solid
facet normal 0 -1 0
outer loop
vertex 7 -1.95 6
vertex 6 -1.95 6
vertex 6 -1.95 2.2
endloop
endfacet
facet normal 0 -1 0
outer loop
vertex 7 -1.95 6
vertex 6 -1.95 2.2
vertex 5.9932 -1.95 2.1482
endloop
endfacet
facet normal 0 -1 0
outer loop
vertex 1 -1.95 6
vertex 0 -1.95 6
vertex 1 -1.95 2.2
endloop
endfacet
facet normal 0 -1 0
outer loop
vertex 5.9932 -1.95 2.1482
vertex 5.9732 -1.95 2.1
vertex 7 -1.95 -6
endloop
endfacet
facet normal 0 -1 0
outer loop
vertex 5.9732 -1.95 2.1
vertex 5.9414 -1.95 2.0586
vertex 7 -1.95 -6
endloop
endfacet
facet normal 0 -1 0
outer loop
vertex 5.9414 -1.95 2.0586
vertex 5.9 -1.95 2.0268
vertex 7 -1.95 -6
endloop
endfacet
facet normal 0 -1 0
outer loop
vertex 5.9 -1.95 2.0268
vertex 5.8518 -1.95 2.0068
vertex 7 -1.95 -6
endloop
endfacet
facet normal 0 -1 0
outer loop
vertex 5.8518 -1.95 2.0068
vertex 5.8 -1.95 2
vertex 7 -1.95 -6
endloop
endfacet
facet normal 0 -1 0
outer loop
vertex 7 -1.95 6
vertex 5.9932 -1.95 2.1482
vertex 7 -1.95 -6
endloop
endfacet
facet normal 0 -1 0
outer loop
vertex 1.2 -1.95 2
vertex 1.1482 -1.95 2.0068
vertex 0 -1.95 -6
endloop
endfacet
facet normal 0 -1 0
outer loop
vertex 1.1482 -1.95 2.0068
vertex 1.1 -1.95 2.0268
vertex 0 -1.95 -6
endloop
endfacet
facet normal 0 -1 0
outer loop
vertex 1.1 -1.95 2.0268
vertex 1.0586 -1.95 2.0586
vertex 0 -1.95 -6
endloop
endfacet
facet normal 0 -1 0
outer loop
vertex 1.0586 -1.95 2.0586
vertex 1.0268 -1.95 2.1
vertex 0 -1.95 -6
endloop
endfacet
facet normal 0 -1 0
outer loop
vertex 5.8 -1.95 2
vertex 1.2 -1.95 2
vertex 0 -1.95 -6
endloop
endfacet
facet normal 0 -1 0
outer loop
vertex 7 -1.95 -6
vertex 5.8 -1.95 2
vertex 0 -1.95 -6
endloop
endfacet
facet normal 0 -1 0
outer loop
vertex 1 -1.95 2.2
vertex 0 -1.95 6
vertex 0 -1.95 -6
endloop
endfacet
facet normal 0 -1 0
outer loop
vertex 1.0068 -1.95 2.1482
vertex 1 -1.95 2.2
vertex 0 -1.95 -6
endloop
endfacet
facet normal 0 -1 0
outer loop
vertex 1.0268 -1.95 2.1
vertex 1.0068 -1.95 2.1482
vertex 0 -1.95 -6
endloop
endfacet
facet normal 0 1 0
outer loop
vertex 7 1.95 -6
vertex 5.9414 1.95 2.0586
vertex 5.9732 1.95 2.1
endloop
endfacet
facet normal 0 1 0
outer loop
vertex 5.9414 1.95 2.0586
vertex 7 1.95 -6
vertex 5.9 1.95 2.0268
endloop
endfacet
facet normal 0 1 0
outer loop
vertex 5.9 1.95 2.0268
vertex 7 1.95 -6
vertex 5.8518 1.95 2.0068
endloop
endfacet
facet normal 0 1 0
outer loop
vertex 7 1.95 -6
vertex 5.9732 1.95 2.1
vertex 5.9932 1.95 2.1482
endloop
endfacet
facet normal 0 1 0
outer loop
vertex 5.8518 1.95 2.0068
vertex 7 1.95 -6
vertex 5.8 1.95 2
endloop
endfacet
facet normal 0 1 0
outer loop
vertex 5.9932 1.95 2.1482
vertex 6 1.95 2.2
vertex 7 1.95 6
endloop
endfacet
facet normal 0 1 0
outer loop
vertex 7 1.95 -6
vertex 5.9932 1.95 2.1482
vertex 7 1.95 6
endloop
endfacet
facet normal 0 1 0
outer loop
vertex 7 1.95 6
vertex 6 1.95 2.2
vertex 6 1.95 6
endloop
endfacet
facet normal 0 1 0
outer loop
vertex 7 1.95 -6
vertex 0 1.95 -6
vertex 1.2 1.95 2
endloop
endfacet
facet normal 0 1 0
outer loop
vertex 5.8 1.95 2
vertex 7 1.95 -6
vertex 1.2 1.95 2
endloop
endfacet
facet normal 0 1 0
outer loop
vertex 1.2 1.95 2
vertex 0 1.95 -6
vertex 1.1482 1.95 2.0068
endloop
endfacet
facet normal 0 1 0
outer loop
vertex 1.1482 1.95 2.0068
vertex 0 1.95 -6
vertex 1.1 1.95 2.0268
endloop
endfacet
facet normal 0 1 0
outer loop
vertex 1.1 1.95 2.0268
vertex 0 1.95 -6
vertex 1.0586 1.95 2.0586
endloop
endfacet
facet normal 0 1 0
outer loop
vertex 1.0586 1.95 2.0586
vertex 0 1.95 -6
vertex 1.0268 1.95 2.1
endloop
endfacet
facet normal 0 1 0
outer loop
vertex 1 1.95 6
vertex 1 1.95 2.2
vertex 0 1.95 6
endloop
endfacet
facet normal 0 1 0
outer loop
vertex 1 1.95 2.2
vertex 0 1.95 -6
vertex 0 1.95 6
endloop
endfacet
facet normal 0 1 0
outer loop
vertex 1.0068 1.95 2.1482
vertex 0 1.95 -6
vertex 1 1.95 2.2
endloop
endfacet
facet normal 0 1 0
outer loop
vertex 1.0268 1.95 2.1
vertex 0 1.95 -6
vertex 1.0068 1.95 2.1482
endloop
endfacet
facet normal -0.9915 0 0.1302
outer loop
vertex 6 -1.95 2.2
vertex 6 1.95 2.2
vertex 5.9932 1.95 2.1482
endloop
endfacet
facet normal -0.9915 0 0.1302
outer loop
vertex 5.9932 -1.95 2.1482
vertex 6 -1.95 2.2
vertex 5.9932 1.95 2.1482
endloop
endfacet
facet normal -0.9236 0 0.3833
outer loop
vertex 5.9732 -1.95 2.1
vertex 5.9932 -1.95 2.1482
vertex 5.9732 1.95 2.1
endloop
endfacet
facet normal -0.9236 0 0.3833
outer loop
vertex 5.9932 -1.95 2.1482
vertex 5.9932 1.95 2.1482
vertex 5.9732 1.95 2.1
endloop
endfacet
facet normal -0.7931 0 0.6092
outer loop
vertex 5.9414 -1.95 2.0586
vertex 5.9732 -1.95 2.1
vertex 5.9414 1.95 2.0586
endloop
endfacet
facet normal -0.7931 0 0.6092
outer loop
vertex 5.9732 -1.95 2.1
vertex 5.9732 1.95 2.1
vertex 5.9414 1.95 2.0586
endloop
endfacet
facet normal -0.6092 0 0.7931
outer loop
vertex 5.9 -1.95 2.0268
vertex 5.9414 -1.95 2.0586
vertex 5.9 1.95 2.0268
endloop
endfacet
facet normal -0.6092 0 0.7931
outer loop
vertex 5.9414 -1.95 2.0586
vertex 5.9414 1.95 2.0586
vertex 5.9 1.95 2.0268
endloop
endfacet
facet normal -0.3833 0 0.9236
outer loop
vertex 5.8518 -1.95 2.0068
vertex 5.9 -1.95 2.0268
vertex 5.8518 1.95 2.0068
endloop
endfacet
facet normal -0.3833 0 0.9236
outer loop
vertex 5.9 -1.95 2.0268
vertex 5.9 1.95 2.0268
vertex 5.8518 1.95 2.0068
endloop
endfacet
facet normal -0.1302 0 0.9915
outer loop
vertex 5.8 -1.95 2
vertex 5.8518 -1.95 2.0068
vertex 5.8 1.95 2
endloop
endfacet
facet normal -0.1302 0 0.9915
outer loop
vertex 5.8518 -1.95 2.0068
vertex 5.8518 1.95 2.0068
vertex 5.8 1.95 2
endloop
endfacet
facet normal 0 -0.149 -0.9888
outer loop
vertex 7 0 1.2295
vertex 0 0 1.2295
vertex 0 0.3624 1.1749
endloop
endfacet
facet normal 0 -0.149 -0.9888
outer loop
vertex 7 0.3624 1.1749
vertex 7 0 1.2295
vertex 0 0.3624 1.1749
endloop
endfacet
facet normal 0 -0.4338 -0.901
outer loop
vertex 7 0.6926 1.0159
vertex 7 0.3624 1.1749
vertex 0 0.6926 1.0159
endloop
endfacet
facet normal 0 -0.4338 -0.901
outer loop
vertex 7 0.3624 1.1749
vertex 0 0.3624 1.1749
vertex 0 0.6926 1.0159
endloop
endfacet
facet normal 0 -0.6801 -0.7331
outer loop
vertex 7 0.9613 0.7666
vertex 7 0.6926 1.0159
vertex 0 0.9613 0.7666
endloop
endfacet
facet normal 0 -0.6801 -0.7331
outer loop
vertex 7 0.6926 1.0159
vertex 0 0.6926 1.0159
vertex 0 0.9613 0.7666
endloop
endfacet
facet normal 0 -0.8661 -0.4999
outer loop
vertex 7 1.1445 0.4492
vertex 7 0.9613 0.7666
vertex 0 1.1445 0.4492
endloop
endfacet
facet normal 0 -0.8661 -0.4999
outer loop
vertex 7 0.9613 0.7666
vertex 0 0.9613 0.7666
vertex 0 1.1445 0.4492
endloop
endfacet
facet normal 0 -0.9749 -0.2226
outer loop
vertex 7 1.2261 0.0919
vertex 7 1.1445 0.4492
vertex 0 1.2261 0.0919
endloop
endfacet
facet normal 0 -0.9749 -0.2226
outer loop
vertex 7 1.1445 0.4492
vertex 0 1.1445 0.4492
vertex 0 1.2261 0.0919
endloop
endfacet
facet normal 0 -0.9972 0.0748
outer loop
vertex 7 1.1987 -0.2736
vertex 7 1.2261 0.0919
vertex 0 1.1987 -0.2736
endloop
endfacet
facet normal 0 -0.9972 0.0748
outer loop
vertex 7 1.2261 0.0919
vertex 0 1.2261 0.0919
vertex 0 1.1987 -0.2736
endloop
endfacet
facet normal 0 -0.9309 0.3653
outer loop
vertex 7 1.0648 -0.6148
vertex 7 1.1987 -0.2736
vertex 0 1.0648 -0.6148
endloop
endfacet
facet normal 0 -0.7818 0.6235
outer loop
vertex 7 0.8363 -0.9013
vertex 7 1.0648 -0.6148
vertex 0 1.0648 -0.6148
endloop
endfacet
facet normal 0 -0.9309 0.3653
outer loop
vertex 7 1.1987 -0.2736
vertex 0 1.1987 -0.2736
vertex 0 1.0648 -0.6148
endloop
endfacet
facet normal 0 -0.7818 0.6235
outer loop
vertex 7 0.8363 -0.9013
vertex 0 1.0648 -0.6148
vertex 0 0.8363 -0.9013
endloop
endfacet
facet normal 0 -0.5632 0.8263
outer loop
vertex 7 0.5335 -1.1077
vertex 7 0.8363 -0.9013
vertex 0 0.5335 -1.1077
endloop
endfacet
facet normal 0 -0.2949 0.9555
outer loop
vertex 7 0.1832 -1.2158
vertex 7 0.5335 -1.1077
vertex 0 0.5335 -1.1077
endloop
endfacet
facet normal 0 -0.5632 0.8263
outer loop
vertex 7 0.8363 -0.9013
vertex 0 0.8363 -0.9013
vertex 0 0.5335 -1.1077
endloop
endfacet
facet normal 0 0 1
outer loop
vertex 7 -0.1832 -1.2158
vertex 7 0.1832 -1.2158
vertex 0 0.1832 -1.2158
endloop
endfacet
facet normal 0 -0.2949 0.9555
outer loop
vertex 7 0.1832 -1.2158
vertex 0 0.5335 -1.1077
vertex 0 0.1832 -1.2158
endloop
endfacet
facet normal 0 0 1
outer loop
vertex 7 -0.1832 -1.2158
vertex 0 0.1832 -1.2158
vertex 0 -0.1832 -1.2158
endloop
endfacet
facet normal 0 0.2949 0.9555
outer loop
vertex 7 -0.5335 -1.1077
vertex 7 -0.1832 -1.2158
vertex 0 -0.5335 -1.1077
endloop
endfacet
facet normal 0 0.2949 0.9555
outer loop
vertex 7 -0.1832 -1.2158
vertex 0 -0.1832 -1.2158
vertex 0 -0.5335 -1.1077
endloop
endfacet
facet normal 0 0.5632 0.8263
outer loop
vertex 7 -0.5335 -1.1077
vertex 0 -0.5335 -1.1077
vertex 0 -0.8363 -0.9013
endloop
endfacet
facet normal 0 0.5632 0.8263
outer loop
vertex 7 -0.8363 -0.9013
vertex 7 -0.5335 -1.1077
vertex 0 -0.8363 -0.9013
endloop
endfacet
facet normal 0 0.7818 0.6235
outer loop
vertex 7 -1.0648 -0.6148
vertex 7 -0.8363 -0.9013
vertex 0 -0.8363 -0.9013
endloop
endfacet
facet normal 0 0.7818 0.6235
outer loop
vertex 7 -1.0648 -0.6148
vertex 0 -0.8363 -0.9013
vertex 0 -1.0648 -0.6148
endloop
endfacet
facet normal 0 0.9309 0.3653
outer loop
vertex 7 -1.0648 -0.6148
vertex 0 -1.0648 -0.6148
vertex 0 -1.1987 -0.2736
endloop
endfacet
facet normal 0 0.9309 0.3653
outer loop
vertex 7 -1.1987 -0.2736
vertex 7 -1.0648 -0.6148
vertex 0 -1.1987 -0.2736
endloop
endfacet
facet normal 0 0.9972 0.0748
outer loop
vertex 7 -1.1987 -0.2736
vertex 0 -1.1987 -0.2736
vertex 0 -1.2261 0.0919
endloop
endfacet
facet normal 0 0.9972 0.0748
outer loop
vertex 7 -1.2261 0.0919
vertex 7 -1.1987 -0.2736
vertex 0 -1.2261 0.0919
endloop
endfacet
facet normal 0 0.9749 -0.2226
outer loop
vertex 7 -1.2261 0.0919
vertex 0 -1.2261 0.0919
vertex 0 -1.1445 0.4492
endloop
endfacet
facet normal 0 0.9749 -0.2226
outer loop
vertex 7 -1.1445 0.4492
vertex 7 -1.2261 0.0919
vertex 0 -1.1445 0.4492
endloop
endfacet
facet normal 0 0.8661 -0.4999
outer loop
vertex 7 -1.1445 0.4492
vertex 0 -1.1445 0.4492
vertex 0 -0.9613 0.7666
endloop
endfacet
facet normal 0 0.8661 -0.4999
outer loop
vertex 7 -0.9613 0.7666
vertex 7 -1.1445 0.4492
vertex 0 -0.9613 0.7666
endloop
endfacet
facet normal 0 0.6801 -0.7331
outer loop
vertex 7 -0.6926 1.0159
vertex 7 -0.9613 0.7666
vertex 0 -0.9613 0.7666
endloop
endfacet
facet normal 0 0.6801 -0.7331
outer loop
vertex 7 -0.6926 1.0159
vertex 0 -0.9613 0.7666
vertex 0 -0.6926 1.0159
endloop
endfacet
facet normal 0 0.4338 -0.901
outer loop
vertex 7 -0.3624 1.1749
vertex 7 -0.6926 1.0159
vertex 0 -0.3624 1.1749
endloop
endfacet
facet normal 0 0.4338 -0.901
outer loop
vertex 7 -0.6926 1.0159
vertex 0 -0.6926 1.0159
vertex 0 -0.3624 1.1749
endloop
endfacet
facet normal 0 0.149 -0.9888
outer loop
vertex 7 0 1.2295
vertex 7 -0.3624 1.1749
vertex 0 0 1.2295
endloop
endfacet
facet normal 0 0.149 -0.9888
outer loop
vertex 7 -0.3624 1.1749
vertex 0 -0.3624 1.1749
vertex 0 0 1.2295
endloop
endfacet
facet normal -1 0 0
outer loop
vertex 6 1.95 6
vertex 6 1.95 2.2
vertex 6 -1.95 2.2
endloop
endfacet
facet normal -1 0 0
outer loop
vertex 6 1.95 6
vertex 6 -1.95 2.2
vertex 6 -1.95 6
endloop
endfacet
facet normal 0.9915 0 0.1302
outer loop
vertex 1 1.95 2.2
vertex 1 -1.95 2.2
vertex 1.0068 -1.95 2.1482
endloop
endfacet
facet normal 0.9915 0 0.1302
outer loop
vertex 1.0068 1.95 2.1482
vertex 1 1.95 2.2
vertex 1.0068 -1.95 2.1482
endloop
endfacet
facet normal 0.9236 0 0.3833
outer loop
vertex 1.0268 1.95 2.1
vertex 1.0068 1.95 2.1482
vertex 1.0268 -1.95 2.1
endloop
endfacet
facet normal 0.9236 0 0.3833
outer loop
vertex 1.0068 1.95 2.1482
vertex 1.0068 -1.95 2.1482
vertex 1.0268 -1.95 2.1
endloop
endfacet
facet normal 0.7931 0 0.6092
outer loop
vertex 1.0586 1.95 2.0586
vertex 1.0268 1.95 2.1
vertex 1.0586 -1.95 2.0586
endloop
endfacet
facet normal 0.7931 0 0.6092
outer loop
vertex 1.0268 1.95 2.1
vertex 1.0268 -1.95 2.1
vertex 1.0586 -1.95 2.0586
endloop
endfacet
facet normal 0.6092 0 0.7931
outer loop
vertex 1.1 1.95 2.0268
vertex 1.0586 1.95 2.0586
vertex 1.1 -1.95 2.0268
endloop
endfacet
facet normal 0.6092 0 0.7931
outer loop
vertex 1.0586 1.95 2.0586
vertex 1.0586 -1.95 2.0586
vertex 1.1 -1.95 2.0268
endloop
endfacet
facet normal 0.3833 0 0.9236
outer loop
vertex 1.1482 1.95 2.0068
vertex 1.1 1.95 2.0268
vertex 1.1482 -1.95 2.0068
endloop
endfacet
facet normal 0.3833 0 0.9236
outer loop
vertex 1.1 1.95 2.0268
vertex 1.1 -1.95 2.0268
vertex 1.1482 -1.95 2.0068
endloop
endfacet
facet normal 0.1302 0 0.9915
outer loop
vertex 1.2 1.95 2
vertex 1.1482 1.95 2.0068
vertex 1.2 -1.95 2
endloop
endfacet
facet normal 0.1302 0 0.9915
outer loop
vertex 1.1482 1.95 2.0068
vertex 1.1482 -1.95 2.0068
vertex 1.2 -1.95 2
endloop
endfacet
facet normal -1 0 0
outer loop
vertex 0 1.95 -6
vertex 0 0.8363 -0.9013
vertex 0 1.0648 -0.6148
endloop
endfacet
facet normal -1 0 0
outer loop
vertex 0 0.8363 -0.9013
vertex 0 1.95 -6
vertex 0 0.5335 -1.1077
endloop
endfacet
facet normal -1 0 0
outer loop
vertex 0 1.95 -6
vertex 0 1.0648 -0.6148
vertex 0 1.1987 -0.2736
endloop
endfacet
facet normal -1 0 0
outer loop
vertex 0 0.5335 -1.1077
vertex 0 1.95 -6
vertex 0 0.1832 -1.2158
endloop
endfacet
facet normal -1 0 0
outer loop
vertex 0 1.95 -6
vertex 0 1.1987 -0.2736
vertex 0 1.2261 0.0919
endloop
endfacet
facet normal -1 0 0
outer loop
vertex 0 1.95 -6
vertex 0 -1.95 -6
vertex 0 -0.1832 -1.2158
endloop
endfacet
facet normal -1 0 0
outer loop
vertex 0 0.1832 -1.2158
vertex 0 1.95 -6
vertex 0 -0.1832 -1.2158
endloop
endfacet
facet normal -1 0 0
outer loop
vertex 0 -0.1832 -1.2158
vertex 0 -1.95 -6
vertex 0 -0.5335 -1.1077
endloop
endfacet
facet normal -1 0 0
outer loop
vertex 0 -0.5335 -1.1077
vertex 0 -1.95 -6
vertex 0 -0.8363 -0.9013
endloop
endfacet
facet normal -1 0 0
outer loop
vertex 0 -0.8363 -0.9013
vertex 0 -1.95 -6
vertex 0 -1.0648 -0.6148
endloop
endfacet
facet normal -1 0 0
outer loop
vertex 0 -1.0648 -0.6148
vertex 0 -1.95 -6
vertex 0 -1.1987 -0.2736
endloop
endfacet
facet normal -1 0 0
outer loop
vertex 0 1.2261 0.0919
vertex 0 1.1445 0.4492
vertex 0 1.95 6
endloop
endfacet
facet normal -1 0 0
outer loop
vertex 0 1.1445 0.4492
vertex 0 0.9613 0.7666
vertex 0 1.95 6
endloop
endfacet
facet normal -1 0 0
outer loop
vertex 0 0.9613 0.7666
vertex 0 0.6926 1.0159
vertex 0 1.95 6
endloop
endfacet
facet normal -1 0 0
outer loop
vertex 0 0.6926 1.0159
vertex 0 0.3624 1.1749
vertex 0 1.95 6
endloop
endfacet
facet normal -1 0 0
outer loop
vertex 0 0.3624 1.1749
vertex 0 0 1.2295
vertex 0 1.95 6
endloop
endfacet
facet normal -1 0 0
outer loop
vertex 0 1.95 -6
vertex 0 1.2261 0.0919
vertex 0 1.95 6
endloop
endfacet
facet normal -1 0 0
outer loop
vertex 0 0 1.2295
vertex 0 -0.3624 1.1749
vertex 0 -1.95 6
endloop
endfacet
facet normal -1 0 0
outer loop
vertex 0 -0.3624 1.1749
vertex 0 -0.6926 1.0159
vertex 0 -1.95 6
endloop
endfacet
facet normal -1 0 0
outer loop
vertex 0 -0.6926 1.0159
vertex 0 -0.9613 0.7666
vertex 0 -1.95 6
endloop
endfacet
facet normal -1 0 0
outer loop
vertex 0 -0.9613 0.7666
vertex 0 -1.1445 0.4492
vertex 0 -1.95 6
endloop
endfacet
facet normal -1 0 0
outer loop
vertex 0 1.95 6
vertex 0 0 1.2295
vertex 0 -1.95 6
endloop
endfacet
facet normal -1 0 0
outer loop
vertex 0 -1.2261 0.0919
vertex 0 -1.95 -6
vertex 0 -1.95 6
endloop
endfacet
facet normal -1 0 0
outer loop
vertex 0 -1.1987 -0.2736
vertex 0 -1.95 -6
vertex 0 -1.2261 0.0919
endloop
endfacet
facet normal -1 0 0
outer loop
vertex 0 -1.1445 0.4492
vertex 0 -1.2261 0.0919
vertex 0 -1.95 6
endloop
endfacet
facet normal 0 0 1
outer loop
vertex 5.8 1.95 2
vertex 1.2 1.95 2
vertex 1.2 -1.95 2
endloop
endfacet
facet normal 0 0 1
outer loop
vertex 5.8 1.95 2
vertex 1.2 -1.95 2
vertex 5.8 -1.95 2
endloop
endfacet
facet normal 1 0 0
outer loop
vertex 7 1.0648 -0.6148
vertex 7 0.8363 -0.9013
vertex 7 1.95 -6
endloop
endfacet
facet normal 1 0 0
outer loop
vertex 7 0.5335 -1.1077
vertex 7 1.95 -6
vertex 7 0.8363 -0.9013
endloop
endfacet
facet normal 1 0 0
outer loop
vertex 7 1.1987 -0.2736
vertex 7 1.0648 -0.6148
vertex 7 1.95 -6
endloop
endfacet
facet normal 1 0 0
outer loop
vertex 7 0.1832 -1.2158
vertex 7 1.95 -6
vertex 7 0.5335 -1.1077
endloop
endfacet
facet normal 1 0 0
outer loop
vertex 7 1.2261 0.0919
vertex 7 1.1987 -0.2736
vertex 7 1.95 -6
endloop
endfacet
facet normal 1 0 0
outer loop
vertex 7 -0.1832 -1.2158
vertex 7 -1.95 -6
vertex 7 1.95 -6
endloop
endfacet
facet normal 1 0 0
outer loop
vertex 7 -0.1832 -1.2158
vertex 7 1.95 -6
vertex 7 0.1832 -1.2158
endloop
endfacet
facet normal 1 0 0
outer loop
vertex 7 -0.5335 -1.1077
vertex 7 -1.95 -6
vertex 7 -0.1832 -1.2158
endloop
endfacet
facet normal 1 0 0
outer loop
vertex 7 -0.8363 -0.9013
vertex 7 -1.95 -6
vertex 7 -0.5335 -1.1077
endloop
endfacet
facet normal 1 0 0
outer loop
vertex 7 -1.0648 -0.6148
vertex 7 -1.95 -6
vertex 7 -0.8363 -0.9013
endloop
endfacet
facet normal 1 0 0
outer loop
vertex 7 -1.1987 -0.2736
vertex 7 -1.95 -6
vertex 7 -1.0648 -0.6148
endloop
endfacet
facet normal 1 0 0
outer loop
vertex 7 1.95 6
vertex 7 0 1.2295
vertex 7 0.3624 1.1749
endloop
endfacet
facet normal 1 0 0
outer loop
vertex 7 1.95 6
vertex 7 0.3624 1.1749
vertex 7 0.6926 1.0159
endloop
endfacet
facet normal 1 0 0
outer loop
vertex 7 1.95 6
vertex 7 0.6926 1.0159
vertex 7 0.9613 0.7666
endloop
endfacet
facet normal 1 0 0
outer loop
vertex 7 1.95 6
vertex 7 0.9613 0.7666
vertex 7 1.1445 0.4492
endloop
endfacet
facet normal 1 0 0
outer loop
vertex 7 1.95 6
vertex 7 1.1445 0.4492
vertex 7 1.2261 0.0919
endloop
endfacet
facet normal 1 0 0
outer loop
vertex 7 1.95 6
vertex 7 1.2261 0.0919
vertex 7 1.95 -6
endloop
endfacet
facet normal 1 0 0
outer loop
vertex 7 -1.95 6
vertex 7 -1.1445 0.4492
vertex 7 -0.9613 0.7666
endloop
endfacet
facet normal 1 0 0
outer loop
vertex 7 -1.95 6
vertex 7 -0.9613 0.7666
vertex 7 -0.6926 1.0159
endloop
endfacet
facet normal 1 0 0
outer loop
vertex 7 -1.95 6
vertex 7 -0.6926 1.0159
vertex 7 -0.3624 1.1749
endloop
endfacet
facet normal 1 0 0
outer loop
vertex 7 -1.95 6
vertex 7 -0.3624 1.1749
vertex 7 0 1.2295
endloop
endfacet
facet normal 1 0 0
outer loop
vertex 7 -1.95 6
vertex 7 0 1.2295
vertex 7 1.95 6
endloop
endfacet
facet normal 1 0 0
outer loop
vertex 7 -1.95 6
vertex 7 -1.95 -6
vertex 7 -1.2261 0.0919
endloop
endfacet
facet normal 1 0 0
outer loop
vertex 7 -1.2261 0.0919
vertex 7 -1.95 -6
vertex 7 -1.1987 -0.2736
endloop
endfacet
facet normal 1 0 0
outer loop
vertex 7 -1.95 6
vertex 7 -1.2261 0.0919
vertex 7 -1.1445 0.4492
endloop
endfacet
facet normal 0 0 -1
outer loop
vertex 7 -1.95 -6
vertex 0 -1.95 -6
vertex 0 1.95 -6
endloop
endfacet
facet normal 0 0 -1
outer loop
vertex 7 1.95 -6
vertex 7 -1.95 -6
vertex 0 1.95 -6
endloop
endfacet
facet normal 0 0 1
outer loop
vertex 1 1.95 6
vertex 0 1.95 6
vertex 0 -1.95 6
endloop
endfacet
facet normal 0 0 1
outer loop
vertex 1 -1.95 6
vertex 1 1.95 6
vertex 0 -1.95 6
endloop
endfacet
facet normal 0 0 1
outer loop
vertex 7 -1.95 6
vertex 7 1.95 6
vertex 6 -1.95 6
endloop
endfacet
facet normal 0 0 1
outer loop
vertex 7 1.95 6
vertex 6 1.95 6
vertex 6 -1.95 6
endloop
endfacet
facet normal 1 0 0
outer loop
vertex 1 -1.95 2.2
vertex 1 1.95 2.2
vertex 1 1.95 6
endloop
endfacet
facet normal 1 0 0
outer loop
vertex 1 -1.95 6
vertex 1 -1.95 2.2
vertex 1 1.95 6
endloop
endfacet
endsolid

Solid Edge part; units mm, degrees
sketch "Sketch1" plane through (0, 0, 0) normal (1, 0, 0) x (0, 1, 0)
  line L0 (-1.95, -6) -> (1.95, -6)
  line L1 (1.95, -6) -> (1.95, 6)
  line L2 (1.95, 6) -> (-1.95, 6)
  line L3 (-1.95, 6) -> (-1.95, -6)
  dimension "D1" = 3.9
  dimension "D2" = 12
extrude "Protrusion1" add sketch "Sketch1" along normal blind 7
hole "Bohrung_2" at (0, 0, 0) direction (1, 0, 0) diameter 2.459 end up to next
sketch "Sketch2" plane through (3.5, -1.95, 0) normal (0, -1, 0) x (1, 0, 0)
  line L0 (-2.5, 6) -> (-2.5, 2)
  line L1 (-2.5, 2) -> (2.5, 2)
  line L2 (2.5, 2) -> (2.5, 6)
  dimension "D1" = 5
  dimension "D2" = 4
extrude "Extrusionsausschnitt_2" cut sketch "Sketch2" along normal mid plane 9.7632 material side at (1.05, -1.95, 4)
fillet "Verrundung_2" radius 0.2 2 edges at (1, 0, 2) (6, 0, 2)
properties part number "052" material "Aluminiumlegierung:3.0205, Al 99.0, EN-AW 1200"
